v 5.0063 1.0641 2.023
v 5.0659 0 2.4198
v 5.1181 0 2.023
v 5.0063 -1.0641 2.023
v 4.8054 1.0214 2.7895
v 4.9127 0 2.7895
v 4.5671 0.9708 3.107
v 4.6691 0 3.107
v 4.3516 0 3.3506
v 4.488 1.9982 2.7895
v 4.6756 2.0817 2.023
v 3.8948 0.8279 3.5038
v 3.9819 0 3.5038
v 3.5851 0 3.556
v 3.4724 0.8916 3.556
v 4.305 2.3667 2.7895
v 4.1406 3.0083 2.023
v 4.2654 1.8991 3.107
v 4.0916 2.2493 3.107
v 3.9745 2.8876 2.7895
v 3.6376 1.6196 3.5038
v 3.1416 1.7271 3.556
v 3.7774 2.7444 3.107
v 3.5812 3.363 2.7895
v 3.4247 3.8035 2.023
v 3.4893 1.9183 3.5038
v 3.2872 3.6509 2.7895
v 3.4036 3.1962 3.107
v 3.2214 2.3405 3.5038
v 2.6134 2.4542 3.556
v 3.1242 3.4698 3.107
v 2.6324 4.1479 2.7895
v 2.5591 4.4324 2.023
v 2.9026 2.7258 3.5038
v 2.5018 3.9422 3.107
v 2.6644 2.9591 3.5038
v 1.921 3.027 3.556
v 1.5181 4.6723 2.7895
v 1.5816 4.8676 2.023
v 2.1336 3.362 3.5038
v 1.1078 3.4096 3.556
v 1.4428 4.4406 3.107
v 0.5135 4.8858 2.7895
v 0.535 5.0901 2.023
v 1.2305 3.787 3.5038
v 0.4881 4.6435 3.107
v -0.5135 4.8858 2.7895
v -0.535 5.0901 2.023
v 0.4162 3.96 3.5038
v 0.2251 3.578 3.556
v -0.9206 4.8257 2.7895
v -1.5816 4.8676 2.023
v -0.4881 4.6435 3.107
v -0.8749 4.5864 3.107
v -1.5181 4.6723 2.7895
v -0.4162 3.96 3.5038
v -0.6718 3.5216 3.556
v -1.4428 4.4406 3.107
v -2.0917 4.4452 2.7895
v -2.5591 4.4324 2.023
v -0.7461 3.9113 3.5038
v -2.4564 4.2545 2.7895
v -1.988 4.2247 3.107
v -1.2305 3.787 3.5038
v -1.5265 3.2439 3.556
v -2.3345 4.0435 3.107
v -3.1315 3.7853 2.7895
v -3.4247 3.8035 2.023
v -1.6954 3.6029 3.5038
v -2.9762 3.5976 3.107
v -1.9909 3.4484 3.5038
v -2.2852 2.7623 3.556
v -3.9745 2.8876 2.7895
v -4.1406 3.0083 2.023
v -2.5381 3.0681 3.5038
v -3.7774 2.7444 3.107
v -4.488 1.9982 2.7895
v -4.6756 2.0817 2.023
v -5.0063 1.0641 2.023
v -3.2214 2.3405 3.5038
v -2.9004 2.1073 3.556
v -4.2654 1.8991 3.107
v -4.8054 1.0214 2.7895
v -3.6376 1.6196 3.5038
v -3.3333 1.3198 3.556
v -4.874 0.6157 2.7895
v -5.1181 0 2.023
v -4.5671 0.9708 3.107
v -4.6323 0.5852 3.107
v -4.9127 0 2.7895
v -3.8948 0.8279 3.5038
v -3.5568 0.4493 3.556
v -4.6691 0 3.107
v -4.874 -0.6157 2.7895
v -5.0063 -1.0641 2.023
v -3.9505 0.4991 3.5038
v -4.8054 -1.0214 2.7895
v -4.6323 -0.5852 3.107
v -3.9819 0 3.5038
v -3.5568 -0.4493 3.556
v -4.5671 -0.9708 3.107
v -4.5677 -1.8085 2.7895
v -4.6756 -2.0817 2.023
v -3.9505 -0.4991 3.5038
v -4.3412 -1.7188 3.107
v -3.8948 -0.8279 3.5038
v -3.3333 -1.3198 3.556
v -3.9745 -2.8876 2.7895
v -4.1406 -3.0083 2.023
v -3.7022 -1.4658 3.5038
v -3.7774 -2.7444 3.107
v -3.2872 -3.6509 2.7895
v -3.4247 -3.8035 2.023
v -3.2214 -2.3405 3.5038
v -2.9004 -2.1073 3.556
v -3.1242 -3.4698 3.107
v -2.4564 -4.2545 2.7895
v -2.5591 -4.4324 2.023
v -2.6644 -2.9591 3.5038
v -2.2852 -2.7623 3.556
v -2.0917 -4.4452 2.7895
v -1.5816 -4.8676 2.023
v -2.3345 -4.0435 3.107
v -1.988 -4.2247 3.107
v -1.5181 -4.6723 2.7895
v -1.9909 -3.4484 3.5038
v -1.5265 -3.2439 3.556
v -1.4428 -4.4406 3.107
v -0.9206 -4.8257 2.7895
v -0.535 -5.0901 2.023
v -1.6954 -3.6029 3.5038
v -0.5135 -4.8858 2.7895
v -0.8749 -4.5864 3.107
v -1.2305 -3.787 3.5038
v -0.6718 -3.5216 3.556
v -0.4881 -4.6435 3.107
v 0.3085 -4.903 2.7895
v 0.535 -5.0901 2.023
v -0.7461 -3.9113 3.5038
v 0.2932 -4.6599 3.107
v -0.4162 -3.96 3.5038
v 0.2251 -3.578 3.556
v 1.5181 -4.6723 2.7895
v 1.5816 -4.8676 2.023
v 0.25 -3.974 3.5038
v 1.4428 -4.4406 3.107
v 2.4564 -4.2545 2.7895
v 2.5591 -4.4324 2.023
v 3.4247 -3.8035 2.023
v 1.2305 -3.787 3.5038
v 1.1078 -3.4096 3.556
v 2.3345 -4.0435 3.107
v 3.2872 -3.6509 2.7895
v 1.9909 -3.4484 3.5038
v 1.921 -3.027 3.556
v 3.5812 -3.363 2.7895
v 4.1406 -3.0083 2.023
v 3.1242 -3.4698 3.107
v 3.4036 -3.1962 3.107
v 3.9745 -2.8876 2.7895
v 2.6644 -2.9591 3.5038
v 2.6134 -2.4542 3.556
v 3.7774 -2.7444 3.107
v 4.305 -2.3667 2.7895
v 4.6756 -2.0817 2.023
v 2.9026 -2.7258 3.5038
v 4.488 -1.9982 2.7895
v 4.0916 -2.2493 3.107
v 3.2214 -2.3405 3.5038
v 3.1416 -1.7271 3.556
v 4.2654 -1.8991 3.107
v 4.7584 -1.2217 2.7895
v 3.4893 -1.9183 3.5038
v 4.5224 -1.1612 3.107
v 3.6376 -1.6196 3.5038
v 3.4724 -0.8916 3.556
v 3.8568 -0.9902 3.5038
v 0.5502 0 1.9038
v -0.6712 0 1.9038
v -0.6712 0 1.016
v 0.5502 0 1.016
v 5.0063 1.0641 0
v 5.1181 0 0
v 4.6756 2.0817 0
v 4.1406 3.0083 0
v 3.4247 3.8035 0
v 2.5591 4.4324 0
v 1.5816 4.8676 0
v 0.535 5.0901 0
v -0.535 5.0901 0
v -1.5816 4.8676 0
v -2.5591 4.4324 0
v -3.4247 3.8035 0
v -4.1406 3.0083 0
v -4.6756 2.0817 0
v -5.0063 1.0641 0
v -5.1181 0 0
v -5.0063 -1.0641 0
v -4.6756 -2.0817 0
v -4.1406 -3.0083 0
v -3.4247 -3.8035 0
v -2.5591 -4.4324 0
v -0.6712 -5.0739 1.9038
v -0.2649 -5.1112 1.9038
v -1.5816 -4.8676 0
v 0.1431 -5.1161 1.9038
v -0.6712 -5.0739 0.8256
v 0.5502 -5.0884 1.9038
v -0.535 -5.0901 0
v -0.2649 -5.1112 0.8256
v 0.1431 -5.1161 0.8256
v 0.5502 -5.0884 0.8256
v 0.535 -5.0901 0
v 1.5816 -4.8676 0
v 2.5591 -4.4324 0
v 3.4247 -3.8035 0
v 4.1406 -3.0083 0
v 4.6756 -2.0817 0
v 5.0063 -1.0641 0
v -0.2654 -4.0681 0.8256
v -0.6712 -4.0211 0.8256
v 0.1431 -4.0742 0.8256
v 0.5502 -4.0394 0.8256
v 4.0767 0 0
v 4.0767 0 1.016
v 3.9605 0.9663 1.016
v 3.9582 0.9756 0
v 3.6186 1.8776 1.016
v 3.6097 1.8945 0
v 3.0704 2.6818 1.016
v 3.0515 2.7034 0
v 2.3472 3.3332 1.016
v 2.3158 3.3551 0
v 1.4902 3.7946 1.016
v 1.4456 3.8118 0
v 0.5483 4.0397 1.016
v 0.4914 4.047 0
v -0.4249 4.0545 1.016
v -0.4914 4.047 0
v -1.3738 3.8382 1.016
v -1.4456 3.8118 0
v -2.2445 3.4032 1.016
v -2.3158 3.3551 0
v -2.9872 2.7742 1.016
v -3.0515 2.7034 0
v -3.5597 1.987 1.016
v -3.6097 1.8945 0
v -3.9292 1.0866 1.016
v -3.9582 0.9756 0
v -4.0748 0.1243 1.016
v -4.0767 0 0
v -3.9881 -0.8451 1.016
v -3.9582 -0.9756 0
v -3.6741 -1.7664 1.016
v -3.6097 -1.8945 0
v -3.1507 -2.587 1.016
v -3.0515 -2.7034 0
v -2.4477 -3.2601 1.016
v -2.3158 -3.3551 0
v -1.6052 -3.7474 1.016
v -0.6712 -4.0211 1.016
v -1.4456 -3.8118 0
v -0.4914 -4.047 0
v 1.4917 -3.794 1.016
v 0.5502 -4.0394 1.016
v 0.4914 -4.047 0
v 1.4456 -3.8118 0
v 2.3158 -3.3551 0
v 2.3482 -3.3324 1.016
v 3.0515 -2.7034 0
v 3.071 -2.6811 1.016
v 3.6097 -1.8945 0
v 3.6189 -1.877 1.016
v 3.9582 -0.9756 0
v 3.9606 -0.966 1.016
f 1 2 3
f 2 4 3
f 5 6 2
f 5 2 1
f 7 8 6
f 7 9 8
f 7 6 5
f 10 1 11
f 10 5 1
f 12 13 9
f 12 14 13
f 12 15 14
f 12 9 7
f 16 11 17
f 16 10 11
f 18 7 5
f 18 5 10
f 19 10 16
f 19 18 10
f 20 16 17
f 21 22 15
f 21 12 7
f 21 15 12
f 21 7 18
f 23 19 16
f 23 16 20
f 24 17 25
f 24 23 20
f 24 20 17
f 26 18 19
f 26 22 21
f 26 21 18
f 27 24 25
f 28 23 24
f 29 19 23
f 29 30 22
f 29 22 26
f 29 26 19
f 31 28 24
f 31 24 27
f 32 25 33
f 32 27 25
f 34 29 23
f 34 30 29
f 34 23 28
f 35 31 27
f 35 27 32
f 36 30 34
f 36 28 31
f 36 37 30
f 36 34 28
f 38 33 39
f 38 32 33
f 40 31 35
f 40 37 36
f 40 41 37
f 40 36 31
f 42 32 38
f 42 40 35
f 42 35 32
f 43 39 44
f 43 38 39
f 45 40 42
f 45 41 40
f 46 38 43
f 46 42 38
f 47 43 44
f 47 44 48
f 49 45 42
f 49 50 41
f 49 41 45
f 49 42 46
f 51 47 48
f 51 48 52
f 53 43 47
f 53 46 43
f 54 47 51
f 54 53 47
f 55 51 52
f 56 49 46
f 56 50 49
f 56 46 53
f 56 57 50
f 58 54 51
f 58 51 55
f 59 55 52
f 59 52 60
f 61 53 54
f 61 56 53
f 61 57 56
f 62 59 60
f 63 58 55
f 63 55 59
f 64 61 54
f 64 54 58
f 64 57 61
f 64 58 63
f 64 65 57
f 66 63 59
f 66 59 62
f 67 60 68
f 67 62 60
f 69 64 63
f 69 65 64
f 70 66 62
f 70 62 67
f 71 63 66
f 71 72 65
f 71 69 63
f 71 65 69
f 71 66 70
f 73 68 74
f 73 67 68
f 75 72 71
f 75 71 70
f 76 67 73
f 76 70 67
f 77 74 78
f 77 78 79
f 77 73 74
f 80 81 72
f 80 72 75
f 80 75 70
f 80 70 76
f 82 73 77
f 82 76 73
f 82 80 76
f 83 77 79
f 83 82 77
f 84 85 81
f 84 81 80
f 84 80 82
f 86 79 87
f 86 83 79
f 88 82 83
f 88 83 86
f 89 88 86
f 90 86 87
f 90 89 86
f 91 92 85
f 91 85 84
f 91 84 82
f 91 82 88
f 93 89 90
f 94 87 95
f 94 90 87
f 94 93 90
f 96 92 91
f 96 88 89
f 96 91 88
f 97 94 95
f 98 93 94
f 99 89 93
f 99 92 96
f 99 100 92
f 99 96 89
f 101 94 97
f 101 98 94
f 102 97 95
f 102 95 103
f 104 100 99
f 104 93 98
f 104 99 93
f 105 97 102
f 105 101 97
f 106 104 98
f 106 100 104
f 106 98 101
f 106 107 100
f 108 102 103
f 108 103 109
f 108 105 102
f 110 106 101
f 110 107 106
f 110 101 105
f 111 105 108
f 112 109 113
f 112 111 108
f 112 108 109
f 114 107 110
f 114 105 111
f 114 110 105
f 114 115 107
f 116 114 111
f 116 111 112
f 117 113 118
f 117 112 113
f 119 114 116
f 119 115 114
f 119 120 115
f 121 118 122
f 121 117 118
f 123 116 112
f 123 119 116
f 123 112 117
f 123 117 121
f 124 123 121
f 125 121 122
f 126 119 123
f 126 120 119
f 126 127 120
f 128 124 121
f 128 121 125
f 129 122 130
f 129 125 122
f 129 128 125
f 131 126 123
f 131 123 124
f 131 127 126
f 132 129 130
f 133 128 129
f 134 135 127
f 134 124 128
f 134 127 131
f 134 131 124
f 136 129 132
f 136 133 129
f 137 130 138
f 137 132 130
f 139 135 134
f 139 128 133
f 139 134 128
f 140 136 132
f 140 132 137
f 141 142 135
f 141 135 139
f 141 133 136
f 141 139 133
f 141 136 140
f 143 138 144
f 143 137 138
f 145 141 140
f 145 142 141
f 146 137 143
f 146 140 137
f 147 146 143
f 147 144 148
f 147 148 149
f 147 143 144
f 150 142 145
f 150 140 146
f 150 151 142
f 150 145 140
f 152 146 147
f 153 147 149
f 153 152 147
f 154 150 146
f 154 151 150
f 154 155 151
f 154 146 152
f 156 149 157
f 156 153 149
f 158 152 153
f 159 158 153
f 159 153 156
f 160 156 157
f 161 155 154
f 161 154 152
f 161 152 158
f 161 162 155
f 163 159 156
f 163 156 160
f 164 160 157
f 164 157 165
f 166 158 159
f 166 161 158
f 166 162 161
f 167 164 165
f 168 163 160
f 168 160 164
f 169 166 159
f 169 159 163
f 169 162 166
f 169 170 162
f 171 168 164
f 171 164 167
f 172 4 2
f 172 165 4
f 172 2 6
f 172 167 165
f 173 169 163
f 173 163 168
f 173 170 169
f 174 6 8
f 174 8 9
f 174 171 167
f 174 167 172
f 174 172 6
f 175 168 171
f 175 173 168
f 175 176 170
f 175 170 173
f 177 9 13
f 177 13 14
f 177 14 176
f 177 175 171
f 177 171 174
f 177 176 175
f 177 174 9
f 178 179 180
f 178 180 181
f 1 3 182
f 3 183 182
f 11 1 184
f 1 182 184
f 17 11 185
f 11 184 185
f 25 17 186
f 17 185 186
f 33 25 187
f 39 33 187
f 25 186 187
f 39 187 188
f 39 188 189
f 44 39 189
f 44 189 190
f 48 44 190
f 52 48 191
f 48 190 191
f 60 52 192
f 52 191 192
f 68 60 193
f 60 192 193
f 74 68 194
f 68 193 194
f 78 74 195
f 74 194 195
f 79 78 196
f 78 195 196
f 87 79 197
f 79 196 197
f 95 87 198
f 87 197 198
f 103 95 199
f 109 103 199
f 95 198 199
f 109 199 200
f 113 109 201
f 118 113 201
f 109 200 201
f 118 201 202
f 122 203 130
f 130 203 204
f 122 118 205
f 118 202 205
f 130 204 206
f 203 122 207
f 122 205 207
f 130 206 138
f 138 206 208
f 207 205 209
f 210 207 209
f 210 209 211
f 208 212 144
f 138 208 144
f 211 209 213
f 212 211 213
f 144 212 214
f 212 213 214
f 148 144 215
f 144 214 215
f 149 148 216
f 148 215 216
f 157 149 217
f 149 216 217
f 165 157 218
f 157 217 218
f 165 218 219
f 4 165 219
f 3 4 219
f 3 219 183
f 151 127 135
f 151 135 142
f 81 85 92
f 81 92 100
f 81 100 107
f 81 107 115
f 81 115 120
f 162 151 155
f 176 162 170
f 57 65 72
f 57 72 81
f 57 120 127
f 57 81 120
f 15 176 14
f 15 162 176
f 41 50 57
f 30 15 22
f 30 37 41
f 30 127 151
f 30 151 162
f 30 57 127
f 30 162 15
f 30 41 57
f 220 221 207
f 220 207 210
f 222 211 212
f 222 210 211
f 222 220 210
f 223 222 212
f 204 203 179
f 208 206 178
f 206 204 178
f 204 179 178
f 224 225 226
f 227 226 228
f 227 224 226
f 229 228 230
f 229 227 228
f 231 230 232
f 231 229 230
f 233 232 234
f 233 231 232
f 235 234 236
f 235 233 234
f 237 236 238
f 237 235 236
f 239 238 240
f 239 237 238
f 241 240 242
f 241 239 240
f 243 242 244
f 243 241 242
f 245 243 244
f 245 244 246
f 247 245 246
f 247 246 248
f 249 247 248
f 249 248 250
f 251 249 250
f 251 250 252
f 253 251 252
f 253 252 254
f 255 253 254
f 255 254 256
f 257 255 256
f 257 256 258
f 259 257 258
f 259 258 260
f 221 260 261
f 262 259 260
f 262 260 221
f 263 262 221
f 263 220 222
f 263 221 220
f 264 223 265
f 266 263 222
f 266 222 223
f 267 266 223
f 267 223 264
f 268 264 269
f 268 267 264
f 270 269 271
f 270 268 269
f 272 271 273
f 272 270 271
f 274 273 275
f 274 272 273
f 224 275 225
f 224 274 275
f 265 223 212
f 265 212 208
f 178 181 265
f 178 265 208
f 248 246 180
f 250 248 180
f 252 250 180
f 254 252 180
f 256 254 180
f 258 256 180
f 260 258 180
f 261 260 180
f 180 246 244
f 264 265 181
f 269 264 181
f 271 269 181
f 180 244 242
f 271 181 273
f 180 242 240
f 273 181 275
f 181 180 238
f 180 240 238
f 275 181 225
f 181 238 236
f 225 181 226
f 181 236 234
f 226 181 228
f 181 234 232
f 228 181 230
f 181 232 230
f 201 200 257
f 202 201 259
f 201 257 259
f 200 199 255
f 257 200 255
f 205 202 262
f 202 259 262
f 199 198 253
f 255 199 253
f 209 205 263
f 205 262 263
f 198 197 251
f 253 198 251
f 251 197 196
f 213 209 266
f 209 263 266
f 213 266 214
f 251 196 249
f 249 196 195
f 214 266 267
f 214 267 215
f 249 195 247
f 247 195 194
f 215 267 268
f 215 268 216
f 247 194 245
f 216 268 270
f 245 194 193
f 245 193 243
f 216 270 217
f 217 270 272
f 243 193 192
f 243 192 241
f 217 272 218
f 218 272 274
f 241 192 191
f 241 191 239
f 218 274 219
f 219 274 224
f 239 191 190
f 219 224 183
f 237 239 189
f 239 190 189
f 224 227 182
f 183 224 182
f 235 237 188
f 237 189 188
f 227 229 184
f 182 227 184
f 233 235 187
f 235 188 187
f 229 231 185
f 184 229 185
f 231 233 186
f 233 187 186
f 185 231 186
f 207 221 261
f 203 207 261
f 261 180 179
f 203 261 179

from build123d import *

# Parameters (mm, degrees)
F0_R     = 5.1181
F1_DEPTH = 3.556
F2_R     = 4.0767
F3_DEPTH = 1.016
F4_R     = 1.533026
F5_W     = 1.221381
F5_H     = 1.078277
F6_DEPTH = 5.4864


with BuildPart() as f1:
    # F0 (on Top) → F1 (new body)
    with BuildSketch(Plane.XY):
        Circle(F0_R)
    extrude(amount=F1_DEPTH)

    # F2 (on Top) → F3 (cut)
    with BuildSketch(Plane.XY):
        Circle(F2_R)
    extrude(amount=F3_DEPTH, mode=Mode.SUBTRACT)

    # F4
    f4_edges = [f1.edges().sort_by_distance(p)[0] for p in [
        (-5.1181, 0, 3.556),
    ]]
    fillet(f4_edges, radius=F4_R)

    # F5 (on Front) → F6 (cut)
    with BuildSketch(Plane.XZ):
        with Locations((-0.060498, 1.36471)):
            Rectangle(F5_W, F5_H)
    extrude(amount=F6_DEPTH, mode=Mode.SUBTRACT)


solid = f1.part
